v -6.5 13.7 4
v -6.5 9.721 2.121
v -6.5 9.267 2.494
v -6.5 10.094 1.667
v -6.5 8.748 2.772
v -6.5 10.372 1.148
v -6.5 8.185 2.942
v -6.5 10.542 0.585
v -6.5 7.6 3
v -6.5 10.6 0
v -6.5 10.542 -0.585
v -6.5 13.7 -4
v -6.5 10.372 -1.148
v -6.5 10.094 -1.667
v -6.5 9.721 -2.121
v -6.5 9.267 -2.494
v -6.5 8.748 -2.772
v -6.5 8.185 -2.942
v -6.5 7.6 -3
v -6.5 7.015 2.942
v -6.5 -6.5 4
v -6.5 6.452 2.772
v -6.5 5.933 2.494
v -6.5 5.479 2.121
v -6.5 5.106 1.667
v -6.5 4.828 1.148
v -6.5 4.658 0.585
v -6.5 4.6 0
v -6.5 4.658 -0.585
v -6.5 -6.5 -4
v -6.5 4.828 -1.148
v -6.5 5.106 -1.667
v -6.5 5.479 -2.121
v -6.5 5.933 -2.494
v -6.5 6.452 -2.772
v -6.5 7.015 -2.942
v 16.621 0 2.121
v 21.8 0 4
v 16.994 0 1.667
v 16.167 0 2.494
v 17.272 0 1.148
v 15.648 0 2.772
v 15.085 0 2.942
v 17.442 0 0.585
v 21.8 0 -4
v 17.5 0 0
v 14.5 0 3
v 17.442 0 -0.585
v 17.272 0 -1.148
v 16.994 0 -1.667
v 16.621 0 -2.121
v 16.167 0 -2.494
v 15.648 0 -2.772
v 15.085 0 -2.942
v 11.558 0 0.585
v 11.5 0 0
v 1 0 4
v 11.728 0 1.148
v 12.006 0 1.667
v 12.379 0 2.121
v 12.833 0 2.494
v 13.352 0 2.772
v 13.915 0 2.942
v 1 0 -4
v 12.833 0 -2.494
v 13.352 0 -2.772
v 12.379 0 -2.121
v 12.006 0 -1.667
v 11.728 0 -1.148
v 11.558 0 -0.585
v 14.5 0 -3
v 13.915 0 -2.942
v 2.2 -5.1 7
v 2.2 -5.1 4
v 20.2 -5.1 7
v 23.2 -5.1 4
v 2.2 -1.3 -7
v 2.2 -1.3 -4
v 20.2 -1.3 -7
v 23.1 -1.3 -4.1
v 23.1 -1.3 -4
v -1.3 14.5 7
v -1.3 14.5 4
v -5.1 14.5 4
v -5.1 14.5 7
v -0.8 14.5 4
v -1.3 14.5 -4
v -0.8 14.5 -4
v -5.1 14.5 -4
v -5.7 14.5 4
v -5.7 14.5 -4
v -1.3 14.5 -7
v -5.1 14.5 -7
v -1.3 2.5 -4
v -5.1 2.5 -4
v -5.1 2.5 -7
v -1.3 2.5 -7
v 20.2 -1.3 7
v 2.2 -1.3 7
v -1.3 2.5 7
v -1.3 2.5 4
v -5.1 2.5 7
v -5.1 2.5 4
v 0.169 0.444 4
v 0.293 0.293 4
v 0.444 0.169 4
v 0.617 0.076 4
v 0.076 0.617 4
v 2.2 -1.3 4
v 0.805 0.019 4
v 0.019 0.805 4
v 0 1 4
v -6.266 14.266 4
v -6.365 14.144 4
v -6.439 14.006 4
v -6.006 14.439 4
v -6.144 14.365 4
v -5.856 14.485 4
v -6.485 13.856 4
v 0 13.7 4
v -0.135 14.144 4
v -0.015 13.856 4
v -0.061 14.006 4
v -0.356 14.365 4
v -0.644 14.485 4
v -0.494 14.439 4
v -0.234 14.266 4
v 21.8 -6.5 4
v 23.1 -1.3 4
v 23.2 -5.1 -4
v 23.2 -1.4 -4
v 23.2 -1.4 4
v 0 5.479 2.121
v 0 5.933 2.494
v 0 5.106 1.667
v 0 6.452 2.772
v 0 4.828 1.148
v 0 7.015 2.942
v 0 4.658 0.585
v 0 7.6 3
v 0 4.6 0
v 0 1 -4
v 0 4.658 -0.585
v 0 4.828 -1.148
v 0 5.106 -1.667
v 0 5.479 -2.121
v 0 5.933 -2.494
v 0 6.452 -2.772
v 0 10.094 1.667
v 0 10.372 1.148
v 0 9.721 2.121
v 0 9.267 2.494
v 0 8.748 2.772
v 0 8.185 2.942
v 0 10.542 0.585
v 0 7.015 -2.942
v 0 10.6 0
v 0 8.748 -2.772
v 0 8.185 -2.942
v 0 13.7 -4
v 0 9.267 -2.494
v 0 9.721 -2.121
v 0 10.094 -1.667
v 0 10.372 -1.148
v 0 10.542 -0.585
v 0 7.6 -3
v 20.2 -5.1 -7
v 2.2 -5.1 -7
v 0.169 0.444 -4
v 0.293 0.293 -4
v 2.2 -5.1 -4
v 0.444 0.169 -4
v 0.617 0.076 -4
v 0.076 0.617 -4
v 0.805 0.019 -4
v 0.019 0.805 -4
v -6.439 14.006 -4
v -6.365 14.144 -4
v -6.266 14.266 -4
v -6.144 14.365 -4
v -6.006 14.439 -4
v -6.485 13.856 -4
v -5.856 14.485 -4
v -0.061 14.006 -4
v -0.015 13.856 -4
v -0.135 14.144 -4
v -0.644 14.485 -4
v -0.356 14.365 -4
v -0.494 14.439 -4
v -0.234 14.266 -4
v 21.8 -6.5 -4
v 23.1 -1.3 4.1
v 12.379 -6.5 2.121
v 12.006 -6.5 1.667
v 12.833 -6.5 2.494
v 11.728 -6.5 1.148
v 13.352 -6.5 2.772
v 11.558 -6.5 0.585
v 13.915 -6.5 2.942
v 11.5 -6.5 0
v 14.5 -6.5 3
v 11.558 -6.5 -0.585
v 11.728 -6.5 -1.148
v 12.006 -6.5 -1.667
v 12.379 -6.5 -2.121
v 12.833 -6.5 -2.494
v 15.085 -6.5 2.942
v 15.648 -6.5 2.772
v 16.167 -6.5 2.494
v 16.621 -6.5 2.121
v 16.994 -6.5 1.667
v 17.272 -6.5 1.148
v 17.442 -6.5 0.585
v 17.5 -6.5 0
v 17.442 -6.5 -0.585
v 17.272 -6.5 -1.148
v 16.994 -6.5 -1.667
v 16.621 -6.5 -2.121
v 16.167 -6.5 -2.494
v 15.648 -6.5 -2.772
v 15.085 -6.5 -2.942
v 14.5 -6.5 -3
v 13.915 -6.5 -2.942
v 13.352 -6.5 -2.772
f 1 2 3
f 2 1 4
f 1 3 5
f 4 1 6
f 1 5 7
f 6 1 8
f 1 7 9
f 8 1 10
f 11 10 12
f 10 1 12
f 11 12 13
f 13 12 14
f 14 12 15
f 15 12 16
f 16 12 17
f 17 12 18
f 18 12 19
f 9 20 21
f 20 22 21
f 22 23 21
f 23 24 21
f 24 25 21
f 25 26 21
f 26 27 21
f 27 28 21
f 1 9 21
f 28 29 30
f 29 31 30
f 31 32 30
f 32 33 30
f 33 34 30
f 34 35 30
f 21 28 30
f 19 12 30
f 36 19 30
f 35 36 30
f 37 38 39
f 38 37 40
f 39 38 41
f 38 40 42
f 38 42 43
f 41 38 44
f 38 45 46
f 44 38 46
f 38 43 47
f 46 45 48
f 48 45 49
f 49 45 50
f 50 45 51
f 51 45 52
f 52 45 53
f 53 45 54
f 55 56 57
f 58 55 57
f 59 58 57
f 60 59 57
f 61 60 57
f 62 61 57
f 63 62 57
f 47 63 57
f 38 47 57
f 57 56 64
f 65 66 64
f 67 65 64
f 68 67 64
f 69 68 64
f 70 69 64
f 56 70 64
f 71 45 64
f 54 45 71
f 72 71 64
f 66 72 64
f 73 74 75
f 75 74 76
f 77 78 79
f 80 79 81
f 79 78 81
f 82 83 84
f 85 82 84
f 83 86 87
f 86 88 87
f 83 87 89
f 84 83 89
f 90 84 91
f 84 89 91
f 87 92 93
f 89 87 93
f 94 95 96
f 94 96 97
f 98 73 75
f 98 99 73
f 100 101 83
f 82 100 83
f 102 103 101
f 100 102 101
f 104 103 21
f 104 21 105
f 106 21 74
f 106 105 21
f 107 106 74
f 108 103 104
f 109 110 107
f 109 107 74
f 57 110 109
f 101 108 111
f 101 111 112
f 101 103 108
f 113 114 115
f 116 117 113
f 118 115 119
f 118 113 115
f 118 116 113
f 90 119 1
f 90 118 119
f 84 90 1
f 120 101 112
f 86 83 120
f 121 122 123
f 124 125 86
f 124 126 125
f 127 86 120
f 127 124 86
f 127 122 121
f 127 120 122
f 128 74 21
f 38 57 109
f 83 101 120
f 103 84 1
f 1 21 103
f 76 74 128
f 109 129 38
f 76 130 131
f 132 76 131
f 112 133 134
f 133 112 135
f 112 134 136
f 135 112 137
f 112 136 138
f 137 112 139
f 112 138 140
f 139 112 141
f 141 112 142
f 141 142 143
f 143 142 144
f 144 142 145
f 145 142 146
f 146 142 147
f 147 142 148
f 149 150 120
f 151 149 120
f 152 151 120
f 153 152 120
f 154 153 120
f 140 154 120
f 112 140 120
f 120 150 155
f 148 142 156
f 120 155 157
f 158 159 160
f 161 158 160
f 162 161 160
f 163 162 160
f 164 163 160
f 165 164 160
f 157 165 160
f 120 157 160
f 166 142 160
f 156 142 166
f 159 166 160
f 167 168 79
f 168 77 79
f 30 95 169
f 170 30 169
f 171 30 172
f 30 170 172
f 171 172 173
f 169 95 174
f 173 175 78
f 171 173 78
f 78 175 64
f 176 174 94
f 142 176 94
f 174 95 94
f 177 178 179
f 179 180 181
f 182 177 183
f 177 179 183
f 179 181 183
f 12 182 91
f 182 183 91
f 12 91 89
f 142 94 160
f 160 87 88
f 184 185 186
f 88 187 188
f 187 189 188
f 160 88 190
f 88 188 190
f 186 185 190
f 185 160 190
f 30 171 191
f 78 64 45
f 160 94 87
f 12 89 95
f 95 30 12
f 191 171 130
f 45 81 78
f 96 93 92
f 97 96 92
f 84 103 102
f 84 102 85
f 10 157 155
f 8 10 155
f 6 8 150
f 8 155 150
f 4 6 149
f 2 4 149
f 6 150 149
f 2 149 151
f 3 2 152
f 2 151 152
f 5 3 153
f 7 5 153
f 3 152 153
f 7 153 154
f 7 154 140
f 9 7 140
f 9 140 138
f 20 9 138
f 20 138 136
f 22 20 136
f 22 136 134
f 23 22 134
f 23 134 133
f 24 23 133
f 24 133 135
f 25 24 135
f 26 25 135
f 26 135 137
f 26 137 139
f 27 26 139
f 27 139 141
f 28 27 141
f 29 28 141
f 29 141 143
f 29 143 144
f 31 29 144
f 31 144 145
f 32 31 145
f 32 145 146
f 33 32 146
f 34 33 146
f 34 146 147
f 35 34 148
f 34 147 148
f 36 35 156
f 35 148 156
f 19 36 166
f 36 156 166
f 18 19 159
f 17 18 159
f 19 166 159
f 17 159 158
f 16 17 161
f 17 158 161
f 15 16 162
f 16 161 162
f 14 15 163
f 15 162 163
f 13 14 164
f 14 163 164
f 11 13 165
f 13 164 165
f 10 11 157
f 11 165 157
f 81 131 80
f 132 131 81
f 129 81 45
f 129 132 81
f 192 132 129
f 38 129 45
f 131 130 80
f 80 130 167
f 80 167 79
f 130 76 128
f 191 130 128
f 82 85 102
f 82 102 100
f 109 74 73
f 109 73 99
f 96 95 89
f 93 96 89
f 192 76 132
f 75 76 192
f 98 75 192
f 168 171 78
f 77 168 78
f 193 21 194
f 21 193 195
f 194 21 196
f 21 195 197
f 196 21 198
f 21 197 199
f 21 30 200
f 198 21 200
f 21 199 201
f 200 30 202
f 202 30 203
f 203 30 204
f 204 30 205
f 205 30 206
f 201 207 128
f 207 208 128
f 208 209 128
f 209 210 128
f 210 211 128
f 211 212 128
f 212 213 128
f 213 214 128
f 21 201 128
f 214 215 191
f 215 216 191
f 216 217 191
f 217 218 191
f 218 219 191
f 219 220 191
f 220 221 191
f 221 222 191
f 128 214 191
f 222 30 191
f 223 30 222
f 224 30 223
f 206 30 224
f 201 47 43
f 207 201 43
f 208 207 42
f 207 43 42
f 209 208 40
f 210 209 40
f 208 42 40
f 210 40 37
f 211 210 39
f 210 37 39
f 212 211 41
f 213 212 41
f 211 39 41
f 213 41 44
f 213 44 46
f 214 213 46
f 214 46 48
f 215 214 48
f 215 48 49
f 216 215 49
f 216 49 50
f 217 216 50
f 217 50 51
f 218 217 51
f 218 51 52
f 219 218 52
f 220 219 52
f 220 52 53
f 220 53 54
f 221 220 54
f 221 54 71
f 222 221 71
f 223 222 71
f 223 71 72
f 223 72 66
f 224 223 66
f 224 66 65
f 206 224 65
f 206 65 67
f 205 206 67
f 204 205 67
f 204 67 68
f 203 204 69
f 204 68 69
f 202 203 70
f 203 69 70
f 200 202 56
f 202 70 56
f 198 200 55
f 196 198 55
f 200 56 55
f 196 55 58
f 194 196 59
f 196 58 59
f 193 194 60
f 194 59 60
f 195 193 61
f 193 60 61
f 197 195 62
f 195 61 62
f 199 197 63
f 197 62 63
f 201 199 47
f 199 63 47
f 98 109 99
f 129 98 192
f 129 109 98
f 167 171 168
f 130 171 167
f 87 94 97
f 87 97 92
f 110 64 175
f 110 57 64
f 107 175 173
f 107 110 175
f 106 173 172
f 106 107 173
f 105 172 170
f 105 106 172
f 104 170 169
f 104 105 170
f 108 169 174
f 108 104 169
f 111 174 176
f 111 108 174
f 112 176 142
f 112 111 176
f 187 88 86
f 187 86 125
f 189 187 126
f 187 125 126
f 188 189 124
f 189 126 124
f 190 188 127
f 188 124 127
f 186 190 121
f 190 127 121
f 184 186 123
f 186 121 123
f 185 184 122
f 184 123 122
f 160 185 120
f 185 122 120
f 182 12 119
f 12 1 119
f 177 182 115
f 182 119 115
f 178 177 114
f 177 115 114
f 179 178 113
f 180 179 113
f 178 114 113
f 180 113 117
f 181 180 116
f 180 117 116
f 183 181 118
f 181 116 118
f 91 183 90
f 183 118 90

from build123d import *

# Parameters (mm, degrees)
EXTRUDE1_DEPTH           = 4
EXTRUDE1_DEPTH_BACK      = 4
SKETCH2_W                = 3.8
SKETCH2_H                = 12
SKETCH2_W_2              = 21
SKETCH2_H_2              = 3.8
EXTRUDE2_DEPTH           = 3
CHAMFER1_SIZE            = 3
CHAMFER1_OF_MIRROR1_SIZE = 3
CHAMFER2_SIZE            = 1.4
EXTRUDE3_REACH           = 30.24
SKETCH4_R                = 3
FILLET1_R                = 0.8
EXTRUDE4_REACH           = 30.24
SKETCH5_R                = 3
FILLET2_R                = 1


with BuildPart() as part:
    # Sketch1 → Extrude1 (new, two sides: drawn at the far end of the back side and taken through both)
    with BuildSketch(Plane.XY.offset(-EXTRUDE1_DEPTH_BACK)):
        Polygon((0, 0), (0, 14.5), (-6.5, 14.5), (-6.5, -6.5), (23.2, -6.5), (23.2, 0), align=None)
    extrude(amount=EXTRUDE1_DEPTH + EXTRUDE1_DEPTH_BACK)

    # Sketch2 → Extrude2 (add)
    with BuildSketch(Plane.XY.offset(4)):
        with Locations((-3.2, 8.5)):
            Rectangle(SKETCH2_W, SKETCH2_H)
        with Locations((12.7, -3.2)):
            Rectangle(SKETCH2_W_2, SKETCH2_H_2)
    extrude2 = extrude(amount=EXTRUDE2_DEPTH)

    # Chamfer1
    chamfer1_edges = [part.edges().sort_by_distance(p)[0] for p in [
        (23.2, -3.2, 7),
    ]]
    chamfer(chamfer1_edges, length=CHAMFER1_SIZE)

    # Mirror1: Extrude2 across plane
    add(extrude2.mirror(Plane.XY))

    # Chamfer1 of Mirror1
    chamfer1_of_mirror1_edges = [part.edges().sort_by_distance(p)[0] for p in [
        (23.2, -3.2, -7),
    ]]
    chamfer(chamfer1_of_mirror1_edges, length=CHAMFER1_OF_MIRROR1_SIZE)

    # Chamfer2
    # the kernel refuses this chamfer: 1.4 mm, written as the material it takes off along each edge
    with BuildSketch(Plane(origin=(23.2, 0, 7.600356183), x_dir=(0.027495876610586112, -0.9996219169112968, 0), z_dir=(0, 0, -1))) as chamfer2_piece_1:
        Polygon((CHAMFER2_SIZE * 0.999621916911, CHAMFER2_SIZE * 0.0274958766106), (-CHAMFER2_SIZE * 0.0274958766106, CHAMFER2_SIZE * 0.999621916911), (0, 0), align=None)
    extrude(amount=15.200712366, mode=Mode.SUBTRACT)
    with BuildSketch(Plane(origin=(23.2, -6.5, 7.600356183), x_dir=(0.02749587661058614, 0.9996219169112968, 0), z_dir=(0, 0, -1))) as chamfer2_piece_2:
        Polygon((CHAMFER2_SIZE * 0.999621916911, -CHAMFER2_SIZE * 0.0274958766106), (-CHAMFER2_SIZE * 0.0274958766106, -CHAMFER2_SIZE * 0.999621916911), (0, 0), align=None)
    extrude(amount=15.200712366, mode=Mode.SUBTRACT)

    # Sketch4 → Extrude3 (cut, up to next)
    with BuildSketch(Plane(origin=(0, 0, 0), x_dir=(1, 0, 0), z_dir=(0, 1, 0)), mode=Mode.PRIVATE) as extrude3_sk1:
        with Locations(Location((14.5, 0, 0), (0, 0, 270))):
            Circle(SKETCH4_R)
    extrude3_tool1 = extrude(extrude3_sk1.sketch, amount=-EXTRUDE3_REACH, mode=Mode.PRIVATE) & part.part
    add(extrude3_tool1.solids().sort_by_distance((14.5, 0, 0))[0], mode=Mode.SUBTRACT)

    # Fillet1
    fillet1_edges = [part.edges().sort_by_distance(p)[0] for p in [
        (-6.5, 14.5, 0),
        (0, 14.5, 0),
    ]]
    fillet(fillet1_edges, radius=FILLET1_R)

    # Sketch5 → Extrude4 (cut, up to next)
    with BuildSketch(Plane(origin=(0, 0, 0), x_dir=(0, 0, -1), z_dir=(1, 0, 0)), mode=Mode.PRIVATE) as extrude4_sk1:
        with Locations(Location((0, 7.6, 0), (0, 0, 90))):
            Circle(SKETCH5_R)
    extrude4_tool1 = extrude(extrude4_sk1.sketch, amount=-EXTRUDE4_REACH, mode=Mode.PRIVATE) & part.part
    add(extrude4_tool1.solids().sort_by_distance((0, 7.6, 0))[0], mode=Mode.SUBTRACT)

    # Fillet2
    fillet2_edges = [part.edges().sort_by_distance(p)[0] for p in [
        (0, 0, 0),
    ]]
    fillet(fillet2_edges, radius=FILLET2_R)


solid = part.part
